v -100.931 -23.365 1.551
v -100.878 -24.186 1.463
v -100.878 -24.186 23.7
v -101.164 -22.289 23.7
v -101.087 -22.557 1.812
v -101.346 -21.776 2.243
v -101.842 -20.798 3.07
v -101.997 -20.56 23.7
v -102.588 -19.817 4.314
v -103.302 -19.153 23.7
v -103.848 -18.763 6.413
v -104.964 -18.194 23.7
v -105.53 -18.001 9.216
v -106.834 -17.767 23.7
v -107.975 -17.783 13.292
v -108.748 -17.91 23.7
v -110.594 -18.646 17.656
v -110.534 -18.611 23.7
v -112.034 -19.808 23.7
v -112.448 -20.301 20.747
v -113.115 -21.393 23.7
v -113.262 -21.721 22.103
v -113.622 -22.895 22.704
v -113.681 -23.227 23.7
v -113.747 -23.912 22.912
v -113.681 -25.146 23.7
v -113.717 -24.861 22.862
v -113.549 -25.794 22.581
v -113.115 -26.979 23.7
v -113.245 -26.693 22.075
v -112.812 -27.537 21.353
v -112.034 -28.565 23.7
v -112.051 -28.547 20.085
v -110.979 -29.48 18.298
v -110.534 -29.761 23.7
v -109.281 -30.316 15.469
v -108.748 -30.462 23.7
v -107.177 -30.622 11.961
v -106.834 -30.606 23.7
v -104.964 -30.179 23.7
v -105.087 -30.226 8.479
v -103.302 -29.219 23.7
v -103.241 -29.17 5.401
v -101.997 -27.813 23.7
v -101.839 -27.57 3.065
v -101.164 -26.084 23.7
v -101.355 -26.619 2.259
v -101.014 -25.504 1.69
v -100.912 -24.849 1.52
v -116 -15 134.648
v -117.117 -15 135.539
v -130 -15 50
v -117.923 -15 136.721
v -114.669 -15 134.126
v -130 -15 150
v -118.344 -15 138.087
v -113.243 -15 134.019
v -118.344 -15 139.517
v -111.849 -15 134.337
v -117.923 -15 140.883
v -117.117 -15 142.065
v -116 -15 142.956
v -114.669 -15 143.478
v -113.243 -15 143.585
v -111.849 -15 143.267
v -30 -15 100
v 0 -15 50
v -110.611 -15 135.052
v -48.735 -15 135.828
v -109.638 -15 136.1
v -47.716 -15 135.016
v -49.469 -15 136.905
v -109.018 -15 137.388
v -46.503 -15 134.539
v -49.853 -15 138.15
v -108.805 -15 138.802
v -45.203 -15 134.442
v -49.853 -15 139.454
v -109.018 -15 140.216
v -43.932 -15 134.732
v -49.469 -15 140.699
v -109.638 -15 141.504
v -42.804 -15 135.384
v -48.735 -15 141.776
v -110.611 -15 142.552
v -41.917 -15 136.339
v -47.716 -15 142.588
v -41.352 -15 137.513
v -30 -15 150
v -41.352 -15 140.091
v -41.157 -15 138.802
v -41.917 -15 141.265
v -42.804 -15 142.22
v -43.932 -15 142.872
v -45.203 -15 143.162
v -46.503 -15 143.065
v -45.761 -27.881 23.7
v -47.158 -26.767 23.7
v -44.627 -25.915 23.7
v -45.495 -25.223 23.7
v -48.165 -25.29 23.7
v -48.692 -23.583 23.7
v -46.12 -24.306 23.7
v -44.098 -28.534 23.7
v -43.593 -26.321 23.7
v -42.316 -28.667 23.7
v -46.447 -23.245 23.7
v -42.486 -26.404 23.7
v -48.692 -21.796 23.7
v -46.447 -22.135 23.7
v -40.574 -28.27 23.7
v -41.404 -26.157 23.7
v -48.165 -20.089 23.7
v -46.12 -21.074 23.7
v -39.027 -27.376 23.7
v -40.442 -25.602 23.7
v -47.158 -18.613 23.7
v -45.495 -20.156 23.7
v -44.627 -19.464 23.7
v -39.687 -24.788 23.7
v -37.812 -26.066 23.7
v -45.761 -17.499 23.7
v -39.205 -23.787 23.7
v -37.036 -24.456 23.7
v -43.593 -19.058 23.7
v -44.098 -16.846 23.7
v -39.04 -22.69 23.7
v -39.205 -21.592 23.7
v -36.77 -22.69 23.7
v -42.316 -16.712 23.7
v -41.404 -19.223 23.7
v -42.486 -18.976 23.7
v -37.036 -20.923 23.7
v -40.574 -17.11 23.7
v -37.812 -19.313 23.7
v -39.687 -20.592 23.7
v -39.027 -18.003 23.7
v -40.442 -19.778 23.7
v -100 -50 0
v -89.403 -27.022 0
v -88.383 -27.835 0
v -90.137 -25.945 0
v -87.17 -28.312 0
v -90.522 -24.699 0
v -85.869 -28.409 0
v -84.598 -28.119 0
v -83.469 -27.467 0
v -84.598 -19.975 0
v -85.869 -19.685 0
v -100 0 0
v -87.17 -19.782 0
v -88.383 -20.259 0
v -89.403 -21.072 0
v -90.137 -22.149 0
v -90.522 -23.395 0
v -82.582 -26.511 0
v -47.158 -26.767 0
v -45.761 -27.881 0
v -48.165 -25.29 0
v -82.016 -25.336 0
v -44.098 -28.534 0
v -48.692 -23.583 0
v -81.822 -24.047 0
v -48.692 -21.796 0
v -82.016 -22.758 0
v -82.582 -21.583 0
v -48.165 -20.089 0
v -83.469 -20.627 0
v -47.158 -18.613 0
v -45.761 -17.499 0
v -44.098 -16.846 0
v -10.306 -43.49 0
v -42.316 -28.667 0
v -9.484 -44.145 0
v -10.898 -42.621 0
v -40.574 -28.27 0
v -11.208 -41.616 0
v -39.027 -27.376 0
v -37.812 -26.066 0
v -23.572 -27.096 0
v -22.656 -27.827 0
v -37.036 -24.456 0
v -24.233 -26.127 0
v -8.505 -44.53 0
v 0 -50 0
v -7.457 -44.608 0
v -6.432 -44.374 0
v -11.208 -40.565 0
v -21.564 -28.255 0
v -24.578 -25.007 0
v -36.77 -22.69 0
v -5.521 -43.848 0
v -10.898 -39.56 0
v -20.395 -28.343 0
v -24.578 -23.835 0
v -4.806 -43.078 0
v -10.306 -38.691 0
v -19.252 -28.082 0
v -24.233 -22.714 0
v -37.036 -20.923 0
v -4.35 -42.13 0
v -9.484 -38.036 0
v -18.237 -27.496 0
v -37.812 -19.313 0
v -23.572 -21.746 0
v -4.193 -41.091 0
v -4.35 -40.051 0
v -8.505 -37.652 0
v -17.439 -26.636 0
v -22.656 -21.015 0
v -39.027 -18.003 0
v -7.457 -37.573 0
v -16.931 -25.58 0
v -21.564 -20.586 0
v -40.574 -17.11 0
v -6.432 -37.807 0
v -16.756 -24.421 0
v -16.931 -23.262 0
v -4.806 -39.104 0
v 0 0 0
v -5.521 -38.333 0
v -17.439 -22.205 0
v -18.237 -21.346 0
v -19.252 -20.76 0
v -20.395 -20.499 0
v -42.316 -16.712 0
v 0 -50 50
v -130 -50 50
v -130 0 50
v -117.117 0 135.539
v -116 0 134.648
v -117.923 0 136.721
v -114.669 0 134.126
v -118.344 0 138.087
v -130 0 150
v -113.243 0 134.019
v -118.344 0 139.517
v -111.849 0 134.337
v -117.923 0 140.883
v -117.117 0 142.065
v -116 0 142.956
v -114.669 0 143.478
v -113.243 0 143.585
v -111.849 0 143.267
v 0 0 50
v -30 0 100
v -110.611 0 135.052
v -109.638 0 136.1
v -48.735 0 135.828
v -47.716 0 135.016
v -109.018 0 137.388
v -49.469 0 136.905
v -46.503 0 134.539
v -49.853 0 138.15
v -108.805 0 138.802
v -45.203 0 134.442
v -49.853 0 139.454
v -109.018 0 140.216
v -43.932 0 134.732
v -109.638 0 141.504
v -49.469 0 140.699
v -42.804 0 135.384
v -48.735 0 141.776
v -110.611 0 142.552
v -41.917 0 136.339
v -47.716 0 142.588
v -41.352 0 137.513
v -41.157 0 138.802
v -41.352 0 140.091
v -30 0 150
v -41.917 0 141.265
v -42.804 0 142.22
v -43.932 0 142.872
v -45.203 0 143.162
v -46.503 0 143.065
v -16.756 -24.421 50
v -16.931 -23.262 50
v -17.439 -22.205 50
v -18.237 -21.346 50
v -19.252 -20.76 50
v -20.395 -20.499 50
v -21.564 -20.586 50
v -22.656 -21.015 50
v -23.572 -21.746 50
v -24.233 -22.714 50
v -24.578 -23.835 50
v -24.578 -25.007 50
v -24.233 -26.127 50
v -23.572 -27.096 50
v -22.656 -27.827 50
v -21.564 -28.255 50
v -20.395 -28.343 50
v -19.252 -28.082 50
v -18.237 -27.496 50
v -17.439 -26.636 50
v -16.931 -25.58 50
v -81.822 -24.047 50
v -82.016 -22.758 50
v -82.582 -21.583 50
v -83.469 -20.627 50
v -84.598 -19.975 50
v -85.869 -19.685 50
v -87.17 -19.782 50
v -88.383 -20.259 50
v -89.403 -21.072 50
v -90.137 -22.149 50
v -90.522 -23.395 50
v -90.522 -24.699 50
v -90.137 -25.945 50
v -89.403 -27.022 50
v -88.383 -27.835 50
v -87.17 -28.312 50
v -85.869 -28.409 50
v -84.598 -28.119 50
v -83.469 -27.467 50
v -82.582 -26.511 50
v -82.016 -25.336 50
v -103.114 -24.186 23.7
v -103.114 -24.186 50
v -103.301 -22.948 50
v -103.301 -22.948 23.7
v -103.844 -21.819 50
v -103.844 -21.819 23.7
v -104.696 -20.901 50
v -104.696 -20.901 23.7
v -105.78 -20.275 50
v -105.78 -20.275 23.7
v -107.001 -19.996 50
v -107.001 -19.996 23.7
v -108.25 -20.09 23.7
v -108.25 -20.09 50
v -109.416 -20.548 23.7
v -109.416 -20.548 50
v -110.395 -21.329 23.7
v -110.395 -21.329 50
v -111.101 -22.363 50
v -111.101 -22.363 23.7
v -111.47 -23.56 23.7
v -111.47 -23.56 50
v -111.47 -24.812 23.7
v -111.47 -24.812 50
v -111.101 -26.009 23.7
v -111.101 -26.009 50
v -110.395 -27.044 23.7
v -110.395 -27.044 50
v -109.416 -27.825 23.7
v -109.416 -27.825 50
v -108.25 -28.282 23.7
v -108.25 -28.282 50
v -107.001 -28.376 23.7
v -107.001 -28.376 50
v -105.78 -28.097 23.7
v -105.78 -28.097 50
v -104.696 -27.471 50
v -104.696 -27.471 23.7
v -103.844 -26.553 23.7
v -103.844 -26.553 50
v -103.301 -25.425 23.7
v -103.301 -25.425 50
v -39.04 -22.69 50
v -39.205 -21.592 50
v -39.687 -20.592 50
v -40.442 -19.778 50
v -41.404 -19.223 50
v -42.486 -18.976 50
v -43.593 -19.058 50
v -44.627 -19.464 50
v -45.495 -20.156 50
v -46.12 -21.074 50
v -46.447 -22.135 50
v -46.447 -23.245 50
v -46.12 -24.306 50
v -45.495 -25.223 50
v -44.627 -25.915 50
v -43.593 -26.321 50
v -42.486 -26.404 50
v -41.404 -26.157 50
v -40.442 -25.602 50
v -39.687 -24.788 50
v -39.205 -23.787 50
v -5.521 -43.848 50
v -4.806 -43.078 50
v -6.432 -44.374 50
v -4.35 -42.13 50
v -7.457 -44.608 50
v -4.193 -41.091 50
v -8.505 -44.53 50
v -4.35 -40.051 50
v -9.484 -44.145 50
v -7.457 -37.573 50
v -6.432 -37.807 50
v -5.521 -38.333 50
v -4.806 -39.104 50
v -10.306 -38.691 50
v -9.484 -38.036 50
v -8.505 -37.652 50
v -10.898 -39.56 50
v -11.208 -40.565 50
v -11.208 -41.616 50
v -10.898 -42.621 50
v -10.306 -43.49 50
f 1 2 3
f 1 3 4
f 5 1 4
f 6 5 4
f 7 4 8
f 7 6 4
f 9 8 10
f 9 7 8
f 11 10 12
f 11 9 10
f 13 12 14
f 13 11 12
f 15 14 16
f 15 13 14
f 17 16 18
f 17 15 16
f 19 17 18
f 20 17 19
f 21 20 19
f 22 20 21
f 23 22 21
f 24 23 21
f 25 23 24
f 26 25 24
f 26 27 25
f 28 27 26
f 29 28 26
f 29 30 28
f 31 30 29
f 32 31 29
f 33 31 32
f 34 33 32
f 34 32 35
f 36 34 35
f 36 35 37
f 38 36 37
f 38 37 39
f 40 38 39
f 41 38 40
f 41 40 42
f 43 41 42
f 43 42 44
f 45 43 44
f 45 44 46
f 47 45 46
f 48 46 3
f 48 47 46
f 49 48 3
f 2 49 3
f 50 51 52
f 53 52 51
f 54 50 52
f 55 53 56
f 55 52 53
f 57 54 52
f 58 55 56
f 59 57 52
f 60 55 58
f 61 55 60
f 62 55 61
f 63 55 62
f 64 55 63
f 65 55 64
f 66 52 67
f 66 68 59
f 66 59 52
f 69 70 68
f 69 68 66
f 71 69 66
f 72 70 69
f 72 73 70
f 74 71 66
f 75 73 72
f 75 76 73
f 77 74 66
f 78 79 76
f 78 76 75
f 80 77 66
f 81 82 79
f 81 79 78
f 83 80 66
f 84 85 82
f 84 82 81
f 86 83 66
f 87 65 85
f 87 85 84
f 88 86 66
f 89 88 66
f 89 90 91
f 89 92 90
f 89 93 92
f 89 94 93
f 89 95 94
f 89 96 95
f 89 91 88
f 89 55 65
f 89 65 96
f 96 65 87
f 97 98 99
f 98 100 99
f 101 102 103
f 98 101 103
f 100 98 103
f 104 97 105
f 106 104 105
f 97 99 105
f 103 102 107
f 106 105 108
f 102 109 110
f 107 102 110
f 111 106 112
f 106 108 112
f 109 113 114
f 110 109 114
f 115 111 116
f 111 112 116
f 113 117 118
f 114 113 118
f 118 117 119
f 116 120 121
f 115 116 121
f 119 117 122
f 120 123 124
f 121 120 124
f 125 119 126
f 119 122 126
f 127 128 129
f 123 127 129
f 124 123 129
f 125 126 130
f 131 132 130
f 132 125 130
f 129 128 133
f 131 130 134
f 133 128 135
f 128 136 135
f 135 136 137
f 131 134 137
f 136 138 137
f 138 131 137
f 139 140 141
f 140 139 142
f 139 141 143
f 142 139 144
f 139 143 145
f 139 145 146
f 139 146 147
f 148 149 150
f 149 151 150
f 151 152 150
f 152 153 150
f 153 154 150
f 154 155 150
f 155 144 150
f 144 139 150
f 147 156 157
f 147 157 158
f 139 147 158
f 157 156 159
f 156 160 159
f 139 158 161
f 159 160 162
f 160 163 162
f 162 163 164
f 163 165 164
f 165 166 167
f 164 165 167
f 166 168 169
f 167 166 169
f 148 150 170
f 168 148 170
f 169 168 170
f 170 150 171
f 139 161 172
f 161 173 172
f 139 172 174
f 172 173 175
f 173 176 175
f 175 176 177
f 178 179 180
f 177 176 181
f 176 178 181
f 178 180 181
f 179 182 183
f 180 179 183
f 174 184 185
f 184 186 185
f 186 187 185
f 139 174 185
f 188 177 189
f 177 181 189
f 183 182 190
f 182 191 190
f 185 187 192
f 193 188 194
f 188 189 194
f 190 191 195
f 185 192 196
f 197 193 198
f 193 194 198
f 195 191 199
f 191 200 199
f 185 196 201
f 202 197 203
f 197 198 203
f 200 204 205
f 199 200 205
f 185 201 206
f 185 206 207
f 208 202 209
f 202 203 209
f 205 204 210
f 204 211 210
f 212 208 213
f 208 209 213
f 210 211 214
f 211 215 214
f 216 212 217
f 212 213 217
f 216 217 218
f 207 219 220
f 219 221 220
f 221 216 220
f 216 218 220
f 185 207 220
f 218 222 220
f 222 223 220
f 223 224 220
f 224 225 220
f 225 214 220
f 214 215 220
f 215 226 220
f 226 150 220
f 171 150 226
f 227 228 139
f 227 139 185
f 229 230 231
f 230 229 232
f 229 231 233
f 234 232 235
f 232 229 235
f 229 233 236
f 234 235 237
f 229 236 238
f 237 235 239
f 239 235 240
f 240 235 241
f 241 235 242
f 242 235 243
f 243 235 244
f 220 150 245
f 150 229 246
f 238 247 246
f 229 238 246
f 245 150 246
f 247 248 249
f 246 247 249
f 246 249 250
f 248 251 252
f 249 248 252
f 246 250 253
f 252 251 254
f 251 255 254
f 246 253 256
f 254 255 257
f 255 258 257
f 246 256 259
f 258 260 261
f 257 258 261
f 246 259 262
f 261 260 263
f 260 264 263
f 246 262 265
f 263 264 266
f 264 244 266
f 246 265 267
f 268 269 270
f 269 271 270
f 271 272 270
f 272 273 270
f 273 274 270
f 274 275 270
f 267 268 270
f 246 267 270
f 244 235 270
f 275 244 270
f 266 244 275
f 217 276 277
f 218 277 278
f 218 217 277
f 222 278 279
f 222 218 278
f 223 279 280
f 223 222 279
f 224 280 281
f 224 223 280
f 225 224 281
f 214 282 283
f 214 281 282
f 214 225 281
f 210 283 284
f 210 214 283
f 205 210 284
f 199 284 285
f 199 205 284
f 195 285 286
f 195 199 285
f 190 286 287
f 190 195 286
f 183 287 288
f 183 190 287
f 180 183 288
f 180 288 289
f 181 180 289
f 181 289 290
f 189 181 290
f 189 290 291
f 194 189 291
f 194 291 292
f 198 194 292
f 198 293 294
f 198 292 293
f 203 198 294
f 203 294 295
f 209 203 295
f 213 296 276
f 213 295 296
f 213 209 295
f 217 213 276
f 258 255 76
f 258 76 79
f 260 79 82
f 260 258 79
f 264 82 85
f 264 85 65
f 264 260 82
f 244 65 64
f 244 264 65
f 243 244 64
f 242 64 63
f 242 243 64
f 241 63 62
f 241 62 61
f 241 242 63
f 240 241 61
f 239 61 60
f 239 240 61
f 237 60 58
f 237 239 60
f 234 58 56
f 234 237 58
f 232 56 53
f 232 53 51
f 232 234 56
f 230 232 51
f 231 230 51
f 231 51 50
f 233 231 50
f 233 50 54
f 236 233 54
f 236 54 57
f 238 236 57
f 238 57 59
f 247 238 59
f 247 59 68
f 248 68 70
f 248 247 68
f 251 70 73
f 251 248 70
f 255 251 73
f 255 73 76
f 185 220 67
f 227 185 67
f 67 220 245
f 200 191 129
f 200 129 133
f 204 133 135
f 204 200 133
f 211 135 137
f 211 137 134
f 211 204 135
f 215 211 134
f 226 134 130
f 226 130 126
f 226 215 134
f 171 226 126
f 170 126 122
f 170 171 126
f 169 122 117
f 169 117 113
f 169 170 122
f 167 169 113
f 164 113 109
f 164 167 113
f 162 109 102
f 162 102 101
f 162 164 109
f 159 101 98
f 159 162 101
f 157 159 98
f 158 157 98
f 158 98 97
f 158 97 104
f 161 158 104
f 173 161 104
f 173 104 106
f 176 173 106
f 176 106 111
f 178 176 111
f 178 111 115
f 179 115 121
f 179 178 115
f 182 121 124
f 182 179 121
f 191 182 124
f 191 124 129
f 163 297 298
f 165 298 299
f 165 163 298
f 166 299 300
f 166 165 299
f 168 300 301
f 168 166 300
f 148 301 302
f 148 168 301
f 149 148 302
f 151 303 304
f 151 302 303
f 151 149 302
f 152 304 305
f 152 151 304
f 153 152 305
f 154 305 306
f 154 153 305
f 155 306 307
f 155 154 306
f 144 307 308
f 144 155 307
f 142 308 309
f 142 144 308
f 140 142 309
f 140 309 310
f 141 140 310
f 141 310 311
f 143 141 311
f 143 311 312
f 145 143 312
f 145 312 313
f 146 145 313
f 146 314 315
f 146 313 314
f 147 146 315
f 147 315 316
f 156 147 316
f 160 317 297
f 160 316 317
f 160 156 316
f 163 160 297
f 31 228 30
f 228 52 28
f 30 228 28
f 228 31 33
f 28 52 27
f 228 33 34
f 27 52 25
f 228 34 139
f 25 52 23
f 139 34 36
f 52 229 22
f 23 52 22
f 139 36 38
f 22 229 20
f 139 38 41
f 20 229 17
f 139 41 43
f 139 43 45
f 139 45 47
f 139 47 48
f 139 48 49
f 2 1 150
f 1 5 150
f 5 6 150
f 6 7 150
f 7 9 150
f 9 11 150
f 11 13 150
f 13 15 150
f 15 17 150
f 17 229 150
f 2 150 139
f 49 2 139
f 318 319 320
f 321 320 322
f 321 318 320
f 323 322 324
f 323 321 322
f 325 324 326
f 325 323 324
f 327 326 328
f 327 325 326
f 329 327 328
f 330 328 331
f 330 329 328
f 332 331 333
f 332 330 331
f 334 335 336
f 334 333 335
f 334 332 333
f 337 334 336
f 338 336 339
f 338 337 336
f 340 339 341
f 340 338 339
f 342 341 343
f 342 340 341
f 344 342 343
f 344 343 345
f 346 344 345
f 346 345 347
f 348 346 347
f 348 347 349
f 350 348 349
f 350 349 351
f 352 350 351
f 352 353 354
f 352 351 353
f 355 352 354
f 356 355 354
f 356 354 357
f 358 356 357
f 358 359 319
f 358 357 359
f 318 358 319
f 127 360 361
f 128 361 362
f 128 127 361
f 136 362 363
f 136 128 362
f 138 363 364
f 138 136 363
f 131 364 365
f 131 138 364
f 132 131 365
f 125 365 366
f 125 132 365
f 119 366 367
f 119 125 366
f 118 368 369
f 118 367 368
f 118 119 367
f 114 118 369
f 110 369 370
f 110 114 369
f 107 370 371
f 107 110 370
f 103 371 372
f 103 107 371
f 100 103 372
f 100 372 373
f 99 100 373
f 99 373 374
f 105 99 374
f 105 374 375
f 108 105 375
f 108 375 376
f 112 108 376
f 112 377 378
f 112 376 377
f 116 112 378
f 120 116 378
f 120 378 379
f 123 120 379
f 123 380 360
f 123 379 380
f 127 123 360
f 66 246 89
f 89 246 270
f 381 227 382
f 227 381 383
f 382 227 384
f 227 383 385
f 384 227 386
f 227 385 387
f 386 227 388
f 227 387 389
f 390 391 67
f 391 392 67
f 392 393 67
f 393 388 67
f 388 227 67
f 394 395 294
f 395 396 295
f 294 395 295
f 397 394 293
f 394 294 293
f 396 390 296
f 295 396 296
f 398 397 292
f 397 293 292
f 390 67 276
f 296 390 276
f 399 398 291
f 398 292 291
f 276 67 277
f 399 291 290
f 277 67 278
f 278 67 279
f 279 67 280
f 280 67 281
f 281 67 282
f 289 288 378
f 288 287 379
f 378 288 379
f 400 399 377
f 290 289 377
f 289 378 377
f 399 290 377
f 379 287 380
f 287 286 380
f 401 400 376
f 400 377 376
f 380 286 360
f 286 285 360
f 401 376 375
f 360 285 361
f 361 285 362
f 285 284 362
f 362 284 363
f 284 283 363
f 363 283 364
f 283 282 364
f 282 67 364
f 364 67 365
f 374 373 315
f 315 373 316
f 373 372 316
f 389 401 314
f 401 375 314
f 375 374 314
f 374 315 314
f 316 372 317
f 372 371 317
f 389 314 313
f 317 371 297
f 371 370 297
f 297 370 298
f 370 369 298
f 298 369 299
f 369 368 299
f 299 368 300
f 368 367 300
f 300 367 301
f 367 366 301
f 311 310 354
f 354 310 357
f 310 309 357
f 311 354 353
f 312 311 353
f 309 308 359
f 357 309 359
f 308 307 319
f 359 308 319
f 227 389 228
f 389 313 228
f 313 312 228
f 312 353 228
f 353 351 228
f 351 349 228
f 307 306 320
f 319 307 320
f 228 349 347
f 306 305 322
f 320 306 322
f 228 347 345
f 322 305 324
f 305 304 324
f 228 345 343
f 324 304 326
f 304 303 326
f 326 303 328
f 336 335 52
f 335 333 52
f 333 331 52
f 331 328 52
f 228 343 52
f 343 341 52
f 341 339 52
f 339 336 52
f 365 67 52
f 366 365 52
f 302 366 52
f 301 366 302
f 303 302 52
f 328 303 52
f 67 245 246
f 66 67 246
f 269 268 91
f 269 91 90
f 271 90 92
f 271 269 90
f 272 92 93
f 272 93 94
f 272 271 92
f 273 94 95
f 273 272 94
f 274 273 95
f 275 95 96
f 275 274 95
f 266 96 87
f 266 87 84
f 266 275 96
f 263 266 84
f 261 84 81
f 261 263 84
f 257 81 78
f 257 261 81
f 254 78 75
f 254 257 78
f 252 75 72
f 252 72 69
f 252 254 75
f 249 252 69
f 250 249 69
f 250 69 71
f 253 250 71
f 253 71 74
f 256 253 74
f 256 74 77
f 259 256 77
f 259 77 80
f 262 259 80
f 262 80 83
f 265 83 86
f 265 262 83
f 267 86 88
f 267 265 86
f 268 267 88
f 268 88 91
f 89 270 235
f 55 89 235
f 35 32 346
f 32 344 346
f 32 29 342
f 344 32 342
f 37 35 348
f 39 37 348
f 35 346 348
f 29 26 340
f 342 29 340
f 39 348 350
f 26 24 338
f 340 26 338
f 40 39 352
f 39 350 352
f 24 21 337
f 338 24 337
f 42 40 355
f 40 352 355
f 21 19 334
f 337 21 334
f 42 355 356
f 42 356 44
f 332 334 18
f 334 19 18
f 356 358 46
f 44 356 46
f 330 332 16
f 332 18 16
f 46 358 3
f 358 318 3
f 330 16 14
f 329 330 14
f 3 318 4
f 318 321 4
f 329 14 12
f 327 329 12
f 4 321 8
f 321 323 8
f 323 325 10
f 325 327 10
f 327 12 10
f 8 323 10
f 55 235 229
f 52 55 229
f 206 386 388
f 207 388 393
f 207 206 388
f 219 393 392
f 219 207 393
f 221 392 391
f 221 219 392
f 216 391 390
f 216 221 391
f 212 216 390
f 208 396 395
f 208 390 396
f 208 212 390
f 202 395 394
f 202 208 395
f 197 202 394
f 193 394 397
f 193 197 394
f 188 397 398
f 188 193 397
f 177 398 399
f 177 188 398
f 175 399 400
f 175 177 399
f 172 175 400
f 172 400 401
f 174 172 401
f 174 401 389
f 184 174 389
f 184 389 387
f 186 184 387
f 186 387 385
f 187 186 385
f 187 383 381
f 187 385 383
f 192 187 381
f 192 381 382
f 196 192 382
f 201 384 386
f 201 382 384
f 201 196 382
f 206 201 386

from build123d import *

# Parameters (mm, degrees)
F0_R     = 4.7966354506
F0_R_2   = 4.3722617323
F1_DEPTH = 15
F2_DEPTH = 50
F3_R     = 3.9330231178
F3_R_2   = 4.374414862
F3_R_3   = 4.2015516797
F3_R_4   = 3.7245553563
F3_R_5   = 3.5273482247
F4_DEPTH = 69
F3_R_6   = 6.4374509429
F3_R_7   = 5.9942154244
F5_DEPTH = 23.7


with BuildPart() as f1:
    # F0 (on Front) → F1 (new body)
    with BuildSketch(Plane.XZ):
        Polygon((-130, 50), (-100, 50), (-30, 50), (-30, 100), (-30, 150), (-130, 150), align=None)
        with Locations((-113.601192832, 138.8020068407)):
            Circle(F0_R, mode=Mode.SUBTRACT)
        with Locations((-45.5297119915, 138.8020068407)):
            Circle(F0_R_2, mode=Mode.SUBTRACT)
        Polygon((-30, 50), (0, 50), (-30, 100), align=None)
    extrude(amount=F1_DEPTH)

    # F0 (on Front) → F2 (join)
    with BuildSketch(Plane.XZ):
        Polygon((-130, 50), (-100, 0), (-100, 50), align=None)
        Polygon((-100, 0), (0, 0), (0, 50), (-30, 50), (-100, 50), align=None)
    extrude(amount=F2_DEPTH)

    # F3 (on Top) → F4 (cut)
    with BuildSketch(Plane.XY):
        with Locations((-20.6890981644, -24.4208239019)):
            Circle(F3_R)
        with Locations((-86.1961916089, -24.0469053388)):
            Circle(F3_R_2)
        with Locations((-107.3154211044, -24.1862814873)):
            Circle(F3_R_3)
        with Locations((-42.7642799914, -22.6896554232)):
            Circle(F3_R_4)
        with Locations((-7.7202138491, -41.0906225443)):
            Circle(F3_R_5)
    extrude(amount=F4_DEPTH, mode=Mode.SUBTRACT)

    # F3 (on Top) → F5 (cut)
    with BuildSketch(Plane.XY):
        with Locations((-107.3154211044, -24.1862814873)):
            Circle(F3_R_6)
        with Locations((-107.3154211044, -24.1862814873)):
            Circle(F3_R_3, mode=Mode.SUBTRACT)
        with Locations((-42.7642799914, -22.6896554232)):
            Circle(F3_R_7)
        with Locations((-42.7642799914, -22.6896554232)):
            Circle(F3_R_4, mode=Mode.SUBTRACT)
    extrude(amount=F5_DEPTH, mode=Mode.SUBTRACT)


solid = f1.part
